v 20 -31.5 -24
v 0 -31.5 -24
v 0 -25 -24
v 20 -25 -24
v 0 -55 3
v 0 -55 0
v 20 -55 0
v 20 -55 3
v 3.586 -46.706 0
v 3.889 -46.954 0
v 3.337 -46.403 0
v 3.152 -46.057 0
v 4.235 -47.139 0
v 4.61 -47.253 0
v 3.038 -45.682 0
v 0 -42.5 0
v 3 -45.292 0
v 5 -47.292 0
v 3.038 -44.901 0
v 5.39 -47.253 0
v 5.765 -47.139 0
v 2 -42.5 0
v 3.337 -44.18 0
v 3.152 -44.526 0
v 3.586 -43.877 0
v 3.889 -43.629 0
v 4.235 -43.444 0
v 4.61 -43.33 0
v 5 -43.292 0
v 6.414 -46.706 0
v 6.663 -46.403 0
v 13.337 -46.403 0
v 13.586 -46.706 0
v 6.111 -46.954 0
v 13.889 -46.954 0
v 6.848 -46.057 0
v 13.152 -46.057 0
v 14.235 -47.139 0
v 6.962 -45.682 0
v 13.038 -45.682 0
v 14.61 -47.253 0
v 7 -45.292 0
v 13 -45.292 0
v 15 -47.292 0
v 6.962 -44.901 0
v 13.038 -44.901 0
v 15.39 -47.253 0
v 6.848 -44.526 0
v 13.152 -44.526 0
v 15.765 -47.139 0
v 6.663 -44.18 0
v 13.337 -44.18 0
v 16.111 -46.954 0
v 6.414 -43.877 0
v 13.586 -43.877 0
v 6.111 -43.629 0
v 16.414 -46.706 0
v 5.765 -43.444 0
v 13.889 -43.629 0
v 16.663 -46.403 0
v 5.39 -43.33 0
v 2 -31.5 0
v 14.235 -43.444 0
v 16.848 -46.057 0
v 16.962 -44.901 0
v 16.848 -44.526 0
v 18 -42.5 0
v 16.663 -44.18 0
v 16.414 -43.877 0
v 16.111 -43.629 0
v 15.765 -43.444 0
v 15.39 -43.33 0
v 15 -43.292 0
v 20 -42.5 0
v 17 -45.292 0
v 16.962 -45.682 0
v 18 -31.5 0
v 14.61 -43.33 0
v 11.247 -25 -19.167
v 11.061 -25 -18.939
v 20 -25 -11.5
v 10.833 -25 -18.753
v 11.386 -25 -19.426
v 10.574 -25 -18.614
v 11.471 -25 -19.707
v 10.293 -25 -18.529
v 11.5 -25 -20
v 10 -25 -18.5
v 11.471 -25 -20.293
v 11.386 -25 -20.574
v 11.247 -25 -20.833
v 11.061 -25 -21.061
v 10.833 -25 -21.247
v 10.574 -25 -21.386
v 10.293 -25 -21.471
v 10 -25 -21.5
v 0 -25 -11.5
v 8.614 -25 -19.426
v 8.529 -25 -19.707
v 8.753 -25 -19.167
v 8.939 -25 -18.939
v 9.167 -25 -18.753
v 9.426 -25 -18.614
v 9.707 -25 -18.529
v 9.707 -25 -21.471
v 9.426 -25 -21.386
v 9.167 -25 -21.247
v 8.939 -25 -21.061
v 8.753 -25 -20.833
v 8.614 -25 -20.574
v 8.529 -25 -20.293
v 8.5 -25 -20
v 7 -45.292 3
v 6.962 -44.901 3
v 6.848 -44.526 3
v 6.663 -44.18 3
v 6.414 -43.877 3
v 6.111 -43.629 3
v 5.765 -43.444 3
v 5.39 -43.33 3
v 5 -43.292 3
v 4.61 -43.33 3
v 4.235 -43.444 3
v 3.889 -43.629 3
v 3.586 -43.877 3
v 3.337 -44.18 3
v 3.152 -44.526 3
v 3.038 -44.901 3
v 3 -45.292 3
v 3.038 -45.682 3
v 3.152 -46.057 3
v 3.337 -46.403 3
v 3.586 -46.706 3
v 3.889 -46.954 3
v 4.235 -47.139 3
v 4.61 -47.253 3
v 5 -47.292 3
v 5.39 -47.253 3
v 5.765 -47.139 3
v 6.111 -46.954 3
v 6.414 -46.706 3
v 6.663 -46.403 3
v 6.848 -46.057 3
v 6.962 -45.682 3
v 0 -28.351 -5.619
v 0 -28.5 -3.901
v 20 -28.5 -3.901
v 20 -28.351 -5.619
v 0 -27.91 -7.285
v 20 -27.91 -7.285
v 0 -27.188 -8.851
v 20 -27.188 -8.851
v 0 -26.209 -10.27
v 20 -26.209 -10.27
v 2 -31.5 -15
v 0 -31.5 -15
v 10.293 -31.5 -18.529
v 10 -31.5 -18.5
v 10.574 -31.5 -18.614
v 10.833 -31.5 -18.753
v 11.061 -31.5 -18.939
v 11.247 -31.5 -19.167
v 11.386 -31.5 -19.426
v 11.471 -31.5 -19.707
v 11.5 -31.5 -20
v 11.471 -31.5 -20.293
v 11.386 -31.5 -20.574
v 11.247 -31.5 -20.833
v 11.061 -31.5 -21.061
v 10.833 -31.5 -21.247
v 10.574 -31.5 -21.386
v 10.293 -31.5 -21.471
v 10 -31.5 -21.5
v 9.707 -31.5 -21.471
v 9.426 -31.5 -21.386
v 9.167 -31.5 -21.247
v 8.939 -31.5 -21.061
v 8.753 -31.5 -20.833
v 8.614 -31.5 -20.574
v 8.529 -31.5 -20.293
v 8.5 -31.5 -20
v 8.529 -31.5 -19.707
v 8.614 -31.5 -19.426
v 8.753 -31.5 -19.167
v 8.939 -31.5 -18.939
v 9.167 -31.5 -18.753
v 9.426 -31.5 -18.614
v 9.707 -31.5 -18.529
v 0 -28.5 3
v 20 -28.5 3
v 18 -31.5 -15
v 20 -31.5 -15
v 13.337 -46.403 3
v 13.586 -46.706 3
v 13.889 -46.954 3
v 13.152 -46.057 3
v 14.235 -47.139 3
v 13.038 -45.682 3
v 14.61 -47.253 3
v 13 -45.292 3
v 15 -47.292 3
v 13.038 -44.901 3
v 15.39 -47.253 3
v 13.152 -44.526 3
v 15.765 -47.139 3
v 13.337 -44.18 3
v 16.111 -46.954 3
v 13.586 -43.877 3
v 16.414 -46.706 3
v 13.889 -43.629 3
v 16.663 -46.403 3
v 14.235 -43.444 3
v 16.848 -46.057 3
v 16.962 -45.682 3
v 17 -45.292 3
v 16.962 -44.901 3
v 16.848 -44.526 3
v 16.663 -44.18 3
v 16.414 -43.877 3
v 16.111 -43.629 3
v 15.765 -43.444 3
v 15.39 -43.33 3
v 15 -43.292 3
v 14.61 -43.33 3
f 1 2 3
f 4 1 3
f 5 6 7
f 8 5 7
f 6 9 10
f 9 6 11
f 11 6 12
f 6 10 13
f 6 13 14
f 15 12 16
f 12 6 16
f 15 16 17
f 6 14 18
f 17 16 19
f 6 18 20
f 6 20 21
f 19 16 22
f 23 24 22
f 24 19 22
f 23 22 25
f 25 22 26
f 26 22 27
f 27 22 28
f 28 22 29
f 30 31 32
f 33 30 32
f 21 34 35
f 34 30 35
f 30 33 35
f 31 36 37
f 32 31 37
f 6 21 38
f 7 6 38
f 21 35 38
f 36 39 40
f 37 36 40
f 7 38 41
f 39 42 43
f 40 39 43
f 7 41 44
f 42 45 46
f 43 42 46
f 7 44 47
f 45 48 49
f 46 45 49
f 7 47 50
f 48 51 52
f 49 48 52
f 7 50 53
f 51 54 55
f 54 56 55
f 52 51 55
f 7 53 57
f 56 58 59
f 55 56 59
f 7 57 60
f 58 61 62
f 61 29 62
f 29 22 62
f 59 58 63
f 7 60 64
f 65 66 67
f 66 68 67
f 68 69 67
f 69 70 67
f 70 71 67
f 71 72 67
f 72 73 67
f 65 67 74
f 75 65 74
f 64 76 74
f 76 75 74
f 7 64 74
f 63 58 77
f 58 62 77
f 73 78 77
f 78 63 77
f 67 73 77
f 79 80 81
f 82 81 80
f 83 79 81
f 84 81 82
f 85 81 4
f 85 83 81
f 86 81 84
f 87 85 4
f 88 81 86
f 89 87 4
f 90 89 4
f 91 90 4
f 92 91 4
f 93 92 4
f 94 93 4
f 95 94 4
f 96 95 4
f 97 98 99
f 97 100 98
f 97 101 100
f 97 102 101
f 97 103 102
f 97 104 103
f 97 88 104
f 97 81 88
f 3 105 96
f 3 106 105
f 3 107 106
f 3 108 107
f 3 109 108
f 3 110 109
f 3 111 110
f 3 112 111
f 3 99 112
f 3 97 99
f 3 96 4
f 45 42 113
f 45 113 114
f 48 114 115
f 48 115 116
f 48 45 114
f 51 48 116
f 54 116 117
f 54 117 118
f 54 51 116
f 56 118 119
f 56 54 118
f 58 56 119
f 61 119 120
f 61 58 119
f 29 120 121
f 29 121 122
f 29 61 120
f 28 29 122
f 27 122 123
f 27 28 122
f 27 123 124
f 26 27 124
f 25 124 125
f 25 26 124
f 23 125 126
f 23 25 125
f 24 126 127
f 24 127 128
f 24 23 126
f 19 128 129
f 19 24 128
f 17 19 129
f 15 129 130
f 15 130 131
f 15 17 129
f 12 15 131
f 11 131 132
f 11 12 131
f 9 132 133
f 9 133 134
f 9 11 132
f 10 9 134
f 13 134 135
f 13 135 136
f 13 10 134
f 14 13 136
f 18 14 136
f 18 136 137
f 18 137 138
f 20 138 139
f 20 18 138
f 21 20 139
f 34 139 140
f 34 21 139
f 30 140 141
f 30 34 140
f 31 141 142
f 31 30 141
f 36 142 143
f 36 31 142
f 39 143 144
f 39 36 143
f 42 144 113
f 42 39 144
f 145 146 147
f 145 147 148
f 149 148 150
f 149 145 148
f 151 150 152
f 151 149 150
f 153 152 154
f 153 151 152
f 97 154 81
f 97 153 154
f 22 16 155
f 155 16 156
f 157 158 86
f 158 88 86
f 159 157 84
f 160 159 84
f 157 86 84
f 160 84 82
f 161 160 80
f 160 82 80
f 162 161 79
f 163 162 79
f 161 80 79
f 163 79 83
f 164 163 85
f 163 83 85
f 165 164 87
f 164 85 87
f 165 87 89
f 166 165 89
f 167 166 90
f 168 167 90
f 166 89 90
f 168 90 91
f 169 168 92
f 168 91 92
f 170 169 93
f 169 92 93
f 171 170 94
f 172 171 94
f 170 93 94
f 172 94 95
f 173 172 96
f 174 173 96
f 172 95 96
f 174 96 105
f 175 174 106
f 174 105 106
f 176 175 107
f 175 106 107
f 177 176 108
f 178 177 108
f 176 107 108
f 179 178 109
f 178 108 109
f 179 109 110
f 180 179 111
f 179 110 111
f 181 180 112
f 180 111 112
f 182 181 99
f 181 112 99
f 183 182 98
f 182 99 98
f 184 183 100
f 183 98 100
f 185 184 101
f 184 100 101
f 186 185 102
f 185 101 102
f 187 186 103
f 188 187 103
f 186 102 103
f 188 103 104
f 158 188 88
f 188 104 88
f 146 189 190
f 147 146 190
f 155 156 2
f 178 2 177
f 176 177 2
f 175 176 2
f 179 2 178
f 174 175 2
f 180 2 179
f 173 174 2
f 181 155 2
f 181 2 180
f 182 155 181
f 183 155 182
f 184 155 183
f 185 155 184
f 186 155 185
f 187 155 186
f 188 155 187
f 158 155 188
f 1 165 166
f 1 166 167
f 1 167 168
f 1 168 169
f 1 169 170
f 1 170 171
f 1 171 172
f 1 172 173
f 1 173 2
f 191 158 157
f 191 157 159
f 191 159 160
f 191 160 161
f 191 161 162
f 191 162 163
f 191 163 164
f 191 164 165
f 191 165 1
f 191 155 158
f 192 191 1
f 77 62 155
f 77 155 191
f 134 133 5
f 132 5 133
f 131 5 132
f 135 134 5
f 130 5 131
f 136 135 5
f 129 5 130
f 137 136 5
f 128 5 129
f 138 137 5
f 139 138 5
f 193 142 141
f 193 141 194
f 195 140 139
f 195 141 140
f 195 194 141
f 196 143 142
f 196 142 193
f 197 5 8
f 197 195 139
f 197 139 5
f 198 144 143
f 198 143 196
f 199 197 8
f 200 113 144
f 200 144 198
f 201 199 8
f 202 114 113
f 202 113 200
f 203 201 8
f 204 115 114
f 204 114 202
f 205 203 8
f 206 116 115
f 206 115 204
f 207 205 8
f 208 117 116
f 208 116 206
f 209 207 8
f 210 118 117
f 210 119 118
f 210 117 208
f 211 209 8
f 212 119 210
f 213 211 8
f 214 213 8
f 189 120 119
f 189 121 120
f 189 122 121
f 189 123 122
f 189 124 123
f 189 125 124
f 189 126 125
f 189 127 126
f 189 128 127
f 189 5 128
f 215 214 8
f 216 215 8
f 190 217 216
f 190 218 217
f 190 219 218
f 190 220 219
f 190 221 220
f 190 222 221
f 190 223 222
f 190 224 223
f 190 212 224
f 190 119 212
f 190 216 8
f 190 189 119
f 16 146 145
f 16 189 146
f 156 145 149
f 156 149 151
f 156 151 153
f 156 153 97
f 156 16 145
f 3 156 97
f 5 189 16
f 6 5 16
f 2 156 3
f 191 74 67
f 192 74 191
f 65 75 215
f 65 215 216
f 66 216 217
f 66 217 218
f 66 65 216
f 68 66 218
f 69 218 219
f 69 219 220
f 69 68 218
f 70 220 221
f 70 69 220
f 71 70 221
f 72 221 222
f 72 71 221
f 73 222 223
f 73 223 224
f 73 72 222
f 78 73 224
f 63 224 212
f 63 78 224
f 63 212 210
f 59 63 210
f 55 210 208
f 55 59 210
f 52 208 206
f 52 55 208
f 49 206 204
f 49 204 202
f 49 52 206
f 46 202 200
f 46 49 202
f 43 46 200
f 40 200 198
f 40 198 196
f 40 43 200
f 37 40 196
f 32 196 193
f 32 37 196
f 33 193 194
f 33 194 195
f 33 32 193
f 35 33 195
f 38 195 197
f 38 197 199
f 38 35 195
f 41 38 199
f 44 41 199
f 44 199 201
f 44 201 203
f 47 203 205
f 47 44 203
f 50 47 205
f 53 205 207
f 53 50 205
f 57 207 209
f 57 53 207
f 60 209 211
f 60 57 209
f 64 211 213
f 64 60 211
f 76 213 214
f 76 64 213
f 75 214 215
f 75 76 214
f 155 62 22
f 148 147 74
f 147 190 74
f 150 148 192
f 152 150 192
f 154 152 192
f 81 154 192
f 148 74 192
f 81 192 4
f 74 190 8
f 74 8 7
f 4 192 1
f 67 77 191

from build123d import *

# Parameters (mm, degrees)
SKETCH_1_W          = 20
SKETCH_1_H          = 26.5
SKETCH_1_R          = 2
EXTRUDE_1_DEPTH     = 3
SKETCH_2_W          = 20
SKETCH_2_H          = 3
EXTRUDE_2_DEPTH     = 24
EXTRUDE_3_DEPTH     = 2
SKETCH_5_W          = 12.5
SKETCH_5_H          = 3.5
EXTRUDE_4_DEPTH     = 20
SKETCH_4_R          = 1.5
CUT_EXTRUDE_1_DEPTH = 10
FILLET_1_R          = 10


with BuildPart() as part:
    # 草图1 → 凸台-拉伸1 (new body)
    with BuildSketch(Plane.XY):
        with Locations((10, -41.75)):
            Rectangle(SKETCH_1_W, SKETCH_1_H)
        with Locations((5, -45.291502622)):
            Circle(SKETCH_1_R, mode=Mode.SUBTRACT)
        with Locations((15, -45.291502622)):
            Circle(SKETCH_1_R, mode=Mode.SUBTRACT)
    extrude(amount=EXTRUDE_1_DEPTH)

    # 草图2 → 凸台-拉伸2 (add)
    with BuildSketch(Plane.XY):
        with Locations((10, -30)):
            Rectangle(SKETCH_2_W, SKETCH_2_H)
    extrude(amount=-EXTRUDE_2_DEPTH)

    # 草图3 → 凸台-拉伸3 (add)
    with BuildSketch(Plane(origin=(0, 0, 0), x_dir=(0, 0, -1), z_dir=(1, 0, 0))):
        Polygon((0, -31.5), (0, -42.5), (15, -31.5), align=None)
    extrude_3 = extrude(amount=EXTRUDE_3_DEPTH)

    # 镜向1: 凸台-拉伸3 across plane
    add(extrude_3.mirror(Plane(origin=(10, 0, 0), x_dir=(0, 0, 1), z_dir=(1, 0, 0))))

    # 草图5 → 凸台-拉伸4 (add)
    with BuildSketch(Plane(origin=(0, 0, 0), x_dir=(0, 0, -1), z_dir=(1, 0, 0))):
        with Locations((17.75, -26.75)):
            Rectangle(SKETCH_5_W, SKETCH_5_H)
    extrude(amount=EXTRUDE_4_DEPTH)

    # 草图4 → 切除-拉伸1 (cut, symmetric)
    with BuildSketch(Plane(origin=(0, -28.5, 0), x_dir=(1, 0, 0), z_dir=(0, 1, 0))):
        with Locations(Location((10, 20, 0), (0, 0, 270))):
            Circle(SKETCH_4_R)
    extrude(amount=CUT_EXTRUDE_1_DEPTH, both=True, mode=Mode.SUBTRACT)

    # 圆角1
    # the kernel refuses this fillet: 10 mm, written as the material it adds along each edge
    with BuildSketch(Plane(origin=(0, -28.5, -11.5), x_dir=(0, 0, 1), z_dir=(1, 0, 0))) as fillet_1_piece_1:
        with BuildLine():
            CenterArc((7.599342077, -10), FILLET_1_R, 90, 49.458398126)
            Line((0, -3.5), (-0.151986842, -3.37))
            ThreePointArc((-0.151986842, -3.37), (-0.2, -1.75), (-0.2, 0))
            Line((-0.2, 0), (0, 0.2))
            Line((0, 0.2), (7.599342077, 0.2))
            Line((7.599342077, 0.2), (7.599342077, 0))
        make_face()
    extrude(amount=20)


solid = part.part
